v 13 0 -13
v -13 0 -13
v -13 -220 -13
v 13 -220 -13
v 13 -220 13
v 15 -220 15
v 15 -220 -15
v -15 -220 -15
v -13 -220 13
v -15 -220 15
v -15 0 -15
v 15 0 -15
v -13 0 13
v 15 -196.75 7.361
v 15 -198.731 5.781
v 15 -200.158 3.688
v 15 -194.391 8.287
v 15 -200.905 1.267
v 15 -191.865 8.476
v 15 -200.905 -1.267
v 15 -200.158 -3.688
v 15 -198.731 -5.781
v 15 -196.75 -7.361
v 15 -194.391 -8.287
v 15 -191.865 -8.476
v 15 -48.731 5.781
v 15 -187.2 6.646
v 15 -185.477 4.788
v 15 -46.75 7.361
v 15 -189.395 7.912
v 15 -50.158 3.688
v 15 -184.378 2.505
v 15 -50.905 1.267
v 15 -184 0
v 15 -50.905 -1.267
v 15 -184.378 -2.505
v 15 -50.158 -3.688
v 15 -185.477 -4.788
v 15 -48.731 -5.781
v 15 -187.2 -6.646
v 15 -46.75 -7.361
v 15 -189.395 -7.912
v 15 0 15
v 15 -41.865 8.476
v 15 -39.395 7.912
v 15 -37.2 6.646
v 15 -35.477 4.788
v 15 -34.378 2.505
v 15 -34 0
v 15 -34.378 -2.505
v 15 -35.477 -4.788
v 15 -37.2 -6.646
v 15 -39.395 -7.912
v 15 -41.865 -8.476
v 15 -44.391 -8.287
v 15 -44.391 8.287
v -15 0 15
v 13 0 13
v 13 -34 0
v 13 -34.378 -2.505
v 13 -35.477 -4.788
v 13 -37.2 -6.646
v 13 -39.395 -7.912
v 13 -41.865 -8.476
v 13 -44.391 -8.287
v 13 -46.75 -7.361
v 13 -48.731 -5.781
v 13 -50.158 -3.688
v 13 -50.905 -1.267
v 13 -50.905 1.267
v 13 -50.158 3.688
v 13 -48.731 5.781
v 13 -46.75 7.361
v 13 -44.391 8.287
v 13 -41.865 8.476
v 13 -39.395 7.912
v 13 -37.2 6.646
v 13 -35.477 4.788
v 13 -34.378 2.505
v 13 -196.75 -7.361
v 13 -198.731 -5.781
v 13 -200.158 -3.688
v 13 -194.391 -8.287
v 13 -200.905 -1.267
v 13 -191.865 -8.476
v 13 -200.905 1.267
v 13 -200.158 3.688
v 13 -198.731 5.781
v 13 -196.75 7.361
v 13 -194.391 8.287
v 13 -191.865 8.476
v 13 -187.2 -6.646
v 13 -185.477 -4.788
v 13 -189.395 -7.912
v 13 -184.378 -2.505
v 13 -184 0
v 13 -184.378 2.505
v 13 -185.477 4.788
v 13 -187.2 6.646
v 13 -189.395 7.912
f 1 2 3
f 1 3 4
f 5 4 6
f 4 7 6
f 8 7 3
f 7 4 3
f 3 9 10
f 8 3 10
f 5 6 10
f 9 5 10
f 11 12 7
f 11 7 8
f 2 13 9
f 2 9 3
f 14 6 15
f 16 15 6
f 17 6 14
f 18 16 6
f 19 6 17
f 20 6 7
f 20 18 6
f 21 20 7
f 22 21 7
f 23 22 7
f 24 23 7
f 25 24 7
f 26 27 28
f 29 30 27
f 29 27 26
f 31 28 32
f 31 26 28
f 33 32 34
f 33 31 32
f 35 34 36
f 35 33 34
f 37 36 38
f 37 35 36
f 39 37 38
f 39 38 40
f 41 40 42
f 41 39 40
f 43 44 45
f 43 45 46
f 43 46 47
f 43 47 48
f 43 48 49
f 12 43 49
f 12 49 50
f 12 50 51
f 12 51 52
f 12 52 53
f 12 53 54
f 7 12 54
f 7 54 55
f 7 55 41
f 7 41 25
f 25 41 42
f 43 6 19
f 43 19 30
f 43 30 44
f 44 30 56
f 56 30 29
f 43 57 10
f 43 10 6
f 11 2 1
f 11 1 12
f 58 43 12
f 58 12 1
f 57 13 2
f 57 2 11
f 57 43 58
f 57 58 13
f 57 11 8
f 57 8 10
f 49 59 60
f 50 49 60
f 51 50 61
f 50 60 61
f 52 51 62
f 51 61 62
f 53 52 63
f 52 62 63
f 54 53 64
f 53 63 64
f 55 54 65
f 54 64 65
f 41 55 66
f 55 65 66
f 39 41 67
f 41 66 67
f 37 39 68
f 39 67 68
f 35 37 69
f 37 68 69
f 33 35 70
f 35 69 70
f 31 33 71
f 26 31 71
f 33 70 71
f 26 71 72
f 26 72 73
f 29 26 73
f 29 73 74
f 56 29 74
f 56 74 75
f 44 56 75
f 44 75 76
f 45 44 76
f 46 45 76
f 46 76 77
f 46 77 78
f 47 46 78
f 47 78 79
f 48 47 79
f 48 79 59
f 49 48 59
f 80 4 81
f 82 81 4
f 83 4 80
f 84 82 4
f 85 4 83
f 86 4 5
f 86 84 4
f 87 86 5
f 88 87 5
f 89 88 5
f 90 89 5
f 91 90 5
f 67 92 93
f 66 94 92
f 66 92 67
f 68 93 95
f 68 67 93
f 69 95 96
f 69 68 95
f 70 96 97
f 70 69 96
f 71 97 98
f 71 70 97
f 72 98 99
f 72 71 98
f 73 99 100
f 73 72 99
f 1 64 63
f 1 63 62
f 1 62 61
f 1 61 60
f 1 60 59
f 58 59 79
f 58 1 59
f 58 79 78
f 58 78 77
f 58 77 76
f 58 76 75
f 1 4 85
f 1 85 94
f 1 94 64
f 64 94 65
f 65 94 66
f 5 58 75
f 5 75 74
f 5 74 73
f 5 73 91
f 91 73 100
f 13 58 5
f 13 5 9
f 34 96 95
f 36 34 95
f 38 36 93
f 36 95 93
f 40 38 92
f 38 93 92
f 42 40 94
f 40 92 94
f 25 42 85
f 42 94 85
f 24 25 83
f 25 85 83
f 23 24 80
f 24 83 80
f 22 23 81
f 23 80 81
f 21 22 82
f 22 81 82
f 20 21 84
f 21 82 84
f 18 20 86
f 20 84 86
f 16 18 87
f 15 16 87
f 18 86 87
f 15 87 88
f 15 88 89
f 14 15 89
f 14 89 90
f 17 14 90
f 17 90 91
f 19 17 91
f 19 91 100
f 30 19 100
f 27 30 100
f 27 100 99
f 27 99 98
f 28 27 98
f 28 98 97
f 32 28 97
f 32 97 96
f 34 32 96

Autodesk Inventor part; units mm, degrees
ref_plane "YZ Plane" through (0, 0, 0) normal (1, 0, 0) x (0, 1, 0)
ref_plane "XZ Plane" through (0, 0, 0) normal (0, 1, 0) x (-1, 0, 0)
ref_plane "XY Plane" through (0, 0, 0) normal (0, 0, 1) x (1, 0, 0)
sketch "Sketch9" plane through (0, 0, 0) normal (0, 1, 0) x (-1, 0, 0)
  line L0 (15, 15) -> (-15, 15)
  line L1 (-15, 15) -> (-15, -15)
  line L2 (-15, -15) -> (15, -15)
  line L3 (15, -15) -> (15, 15)
  line L4 (15, 15) -> (-15, -15) construction
  line L5 (-15, 15) -> (15, -15) construction
  line L6 (-13, 13) -> (13, 13)
  line L7 (13, 13) -> (13, -13)
  line L8 (13, -13) -> (-13, -13)
  line L9 (-13, -13) -> (-13, 13)
  point P0 (0, 0)
  dimension "d172" = 30
  dimension "d173" = 30
  dimension "d174" = 2
extrude "Extrusion3" add sketch "Sketch9" against normal blind 220
sketch "Sketch10" plane through (0, 0, 0) normal (1, 0, 0) x (0, 1, 0)
  line L0 (0, 15) -> (0, -15) construction
  line L1 (0, 15) -> (-220, 15) construction
  line L2 (-220, -15) -> (-220, 15) construction
  line L3 (0, -15) -> (-220, -15) construction
  line L4 (-201, 8.5) -> (-184, 8.5)
  line L5 (-184, 8.5) -> (-184, -8.5)
  line L6 (-184, -8.5) -> (-201, -8.5)
  line L7 (-201, -8.5) -> (-201, 8.5)
  line L8 (-201, 8.5) -> (-184, -8.5) construction
  line L9 (-184, 8.5) -> (-201, -8.5) construction
  circle A0 centre (-192.5, 0) radius 8.5
  line L10 (0, 15) -> (0, -15) projected
  point P0 (0, 0)
  point P1 (0, 0)
  point P2 (-220, 0)
  dimension "d177" = 17
  dimension "d178" = 17
  dimension "d191" = 19
extrude "Extrusion4" cut sketch "Sketch10" along normal through all contours A0
pattern_linear "Rectangular Pattern4" count 2 spacing 150 along (0, 1, 0) of "Extrusion4"
properties part number "ANP 1437 FDS WAY tube7" material "Stainless Steel"
